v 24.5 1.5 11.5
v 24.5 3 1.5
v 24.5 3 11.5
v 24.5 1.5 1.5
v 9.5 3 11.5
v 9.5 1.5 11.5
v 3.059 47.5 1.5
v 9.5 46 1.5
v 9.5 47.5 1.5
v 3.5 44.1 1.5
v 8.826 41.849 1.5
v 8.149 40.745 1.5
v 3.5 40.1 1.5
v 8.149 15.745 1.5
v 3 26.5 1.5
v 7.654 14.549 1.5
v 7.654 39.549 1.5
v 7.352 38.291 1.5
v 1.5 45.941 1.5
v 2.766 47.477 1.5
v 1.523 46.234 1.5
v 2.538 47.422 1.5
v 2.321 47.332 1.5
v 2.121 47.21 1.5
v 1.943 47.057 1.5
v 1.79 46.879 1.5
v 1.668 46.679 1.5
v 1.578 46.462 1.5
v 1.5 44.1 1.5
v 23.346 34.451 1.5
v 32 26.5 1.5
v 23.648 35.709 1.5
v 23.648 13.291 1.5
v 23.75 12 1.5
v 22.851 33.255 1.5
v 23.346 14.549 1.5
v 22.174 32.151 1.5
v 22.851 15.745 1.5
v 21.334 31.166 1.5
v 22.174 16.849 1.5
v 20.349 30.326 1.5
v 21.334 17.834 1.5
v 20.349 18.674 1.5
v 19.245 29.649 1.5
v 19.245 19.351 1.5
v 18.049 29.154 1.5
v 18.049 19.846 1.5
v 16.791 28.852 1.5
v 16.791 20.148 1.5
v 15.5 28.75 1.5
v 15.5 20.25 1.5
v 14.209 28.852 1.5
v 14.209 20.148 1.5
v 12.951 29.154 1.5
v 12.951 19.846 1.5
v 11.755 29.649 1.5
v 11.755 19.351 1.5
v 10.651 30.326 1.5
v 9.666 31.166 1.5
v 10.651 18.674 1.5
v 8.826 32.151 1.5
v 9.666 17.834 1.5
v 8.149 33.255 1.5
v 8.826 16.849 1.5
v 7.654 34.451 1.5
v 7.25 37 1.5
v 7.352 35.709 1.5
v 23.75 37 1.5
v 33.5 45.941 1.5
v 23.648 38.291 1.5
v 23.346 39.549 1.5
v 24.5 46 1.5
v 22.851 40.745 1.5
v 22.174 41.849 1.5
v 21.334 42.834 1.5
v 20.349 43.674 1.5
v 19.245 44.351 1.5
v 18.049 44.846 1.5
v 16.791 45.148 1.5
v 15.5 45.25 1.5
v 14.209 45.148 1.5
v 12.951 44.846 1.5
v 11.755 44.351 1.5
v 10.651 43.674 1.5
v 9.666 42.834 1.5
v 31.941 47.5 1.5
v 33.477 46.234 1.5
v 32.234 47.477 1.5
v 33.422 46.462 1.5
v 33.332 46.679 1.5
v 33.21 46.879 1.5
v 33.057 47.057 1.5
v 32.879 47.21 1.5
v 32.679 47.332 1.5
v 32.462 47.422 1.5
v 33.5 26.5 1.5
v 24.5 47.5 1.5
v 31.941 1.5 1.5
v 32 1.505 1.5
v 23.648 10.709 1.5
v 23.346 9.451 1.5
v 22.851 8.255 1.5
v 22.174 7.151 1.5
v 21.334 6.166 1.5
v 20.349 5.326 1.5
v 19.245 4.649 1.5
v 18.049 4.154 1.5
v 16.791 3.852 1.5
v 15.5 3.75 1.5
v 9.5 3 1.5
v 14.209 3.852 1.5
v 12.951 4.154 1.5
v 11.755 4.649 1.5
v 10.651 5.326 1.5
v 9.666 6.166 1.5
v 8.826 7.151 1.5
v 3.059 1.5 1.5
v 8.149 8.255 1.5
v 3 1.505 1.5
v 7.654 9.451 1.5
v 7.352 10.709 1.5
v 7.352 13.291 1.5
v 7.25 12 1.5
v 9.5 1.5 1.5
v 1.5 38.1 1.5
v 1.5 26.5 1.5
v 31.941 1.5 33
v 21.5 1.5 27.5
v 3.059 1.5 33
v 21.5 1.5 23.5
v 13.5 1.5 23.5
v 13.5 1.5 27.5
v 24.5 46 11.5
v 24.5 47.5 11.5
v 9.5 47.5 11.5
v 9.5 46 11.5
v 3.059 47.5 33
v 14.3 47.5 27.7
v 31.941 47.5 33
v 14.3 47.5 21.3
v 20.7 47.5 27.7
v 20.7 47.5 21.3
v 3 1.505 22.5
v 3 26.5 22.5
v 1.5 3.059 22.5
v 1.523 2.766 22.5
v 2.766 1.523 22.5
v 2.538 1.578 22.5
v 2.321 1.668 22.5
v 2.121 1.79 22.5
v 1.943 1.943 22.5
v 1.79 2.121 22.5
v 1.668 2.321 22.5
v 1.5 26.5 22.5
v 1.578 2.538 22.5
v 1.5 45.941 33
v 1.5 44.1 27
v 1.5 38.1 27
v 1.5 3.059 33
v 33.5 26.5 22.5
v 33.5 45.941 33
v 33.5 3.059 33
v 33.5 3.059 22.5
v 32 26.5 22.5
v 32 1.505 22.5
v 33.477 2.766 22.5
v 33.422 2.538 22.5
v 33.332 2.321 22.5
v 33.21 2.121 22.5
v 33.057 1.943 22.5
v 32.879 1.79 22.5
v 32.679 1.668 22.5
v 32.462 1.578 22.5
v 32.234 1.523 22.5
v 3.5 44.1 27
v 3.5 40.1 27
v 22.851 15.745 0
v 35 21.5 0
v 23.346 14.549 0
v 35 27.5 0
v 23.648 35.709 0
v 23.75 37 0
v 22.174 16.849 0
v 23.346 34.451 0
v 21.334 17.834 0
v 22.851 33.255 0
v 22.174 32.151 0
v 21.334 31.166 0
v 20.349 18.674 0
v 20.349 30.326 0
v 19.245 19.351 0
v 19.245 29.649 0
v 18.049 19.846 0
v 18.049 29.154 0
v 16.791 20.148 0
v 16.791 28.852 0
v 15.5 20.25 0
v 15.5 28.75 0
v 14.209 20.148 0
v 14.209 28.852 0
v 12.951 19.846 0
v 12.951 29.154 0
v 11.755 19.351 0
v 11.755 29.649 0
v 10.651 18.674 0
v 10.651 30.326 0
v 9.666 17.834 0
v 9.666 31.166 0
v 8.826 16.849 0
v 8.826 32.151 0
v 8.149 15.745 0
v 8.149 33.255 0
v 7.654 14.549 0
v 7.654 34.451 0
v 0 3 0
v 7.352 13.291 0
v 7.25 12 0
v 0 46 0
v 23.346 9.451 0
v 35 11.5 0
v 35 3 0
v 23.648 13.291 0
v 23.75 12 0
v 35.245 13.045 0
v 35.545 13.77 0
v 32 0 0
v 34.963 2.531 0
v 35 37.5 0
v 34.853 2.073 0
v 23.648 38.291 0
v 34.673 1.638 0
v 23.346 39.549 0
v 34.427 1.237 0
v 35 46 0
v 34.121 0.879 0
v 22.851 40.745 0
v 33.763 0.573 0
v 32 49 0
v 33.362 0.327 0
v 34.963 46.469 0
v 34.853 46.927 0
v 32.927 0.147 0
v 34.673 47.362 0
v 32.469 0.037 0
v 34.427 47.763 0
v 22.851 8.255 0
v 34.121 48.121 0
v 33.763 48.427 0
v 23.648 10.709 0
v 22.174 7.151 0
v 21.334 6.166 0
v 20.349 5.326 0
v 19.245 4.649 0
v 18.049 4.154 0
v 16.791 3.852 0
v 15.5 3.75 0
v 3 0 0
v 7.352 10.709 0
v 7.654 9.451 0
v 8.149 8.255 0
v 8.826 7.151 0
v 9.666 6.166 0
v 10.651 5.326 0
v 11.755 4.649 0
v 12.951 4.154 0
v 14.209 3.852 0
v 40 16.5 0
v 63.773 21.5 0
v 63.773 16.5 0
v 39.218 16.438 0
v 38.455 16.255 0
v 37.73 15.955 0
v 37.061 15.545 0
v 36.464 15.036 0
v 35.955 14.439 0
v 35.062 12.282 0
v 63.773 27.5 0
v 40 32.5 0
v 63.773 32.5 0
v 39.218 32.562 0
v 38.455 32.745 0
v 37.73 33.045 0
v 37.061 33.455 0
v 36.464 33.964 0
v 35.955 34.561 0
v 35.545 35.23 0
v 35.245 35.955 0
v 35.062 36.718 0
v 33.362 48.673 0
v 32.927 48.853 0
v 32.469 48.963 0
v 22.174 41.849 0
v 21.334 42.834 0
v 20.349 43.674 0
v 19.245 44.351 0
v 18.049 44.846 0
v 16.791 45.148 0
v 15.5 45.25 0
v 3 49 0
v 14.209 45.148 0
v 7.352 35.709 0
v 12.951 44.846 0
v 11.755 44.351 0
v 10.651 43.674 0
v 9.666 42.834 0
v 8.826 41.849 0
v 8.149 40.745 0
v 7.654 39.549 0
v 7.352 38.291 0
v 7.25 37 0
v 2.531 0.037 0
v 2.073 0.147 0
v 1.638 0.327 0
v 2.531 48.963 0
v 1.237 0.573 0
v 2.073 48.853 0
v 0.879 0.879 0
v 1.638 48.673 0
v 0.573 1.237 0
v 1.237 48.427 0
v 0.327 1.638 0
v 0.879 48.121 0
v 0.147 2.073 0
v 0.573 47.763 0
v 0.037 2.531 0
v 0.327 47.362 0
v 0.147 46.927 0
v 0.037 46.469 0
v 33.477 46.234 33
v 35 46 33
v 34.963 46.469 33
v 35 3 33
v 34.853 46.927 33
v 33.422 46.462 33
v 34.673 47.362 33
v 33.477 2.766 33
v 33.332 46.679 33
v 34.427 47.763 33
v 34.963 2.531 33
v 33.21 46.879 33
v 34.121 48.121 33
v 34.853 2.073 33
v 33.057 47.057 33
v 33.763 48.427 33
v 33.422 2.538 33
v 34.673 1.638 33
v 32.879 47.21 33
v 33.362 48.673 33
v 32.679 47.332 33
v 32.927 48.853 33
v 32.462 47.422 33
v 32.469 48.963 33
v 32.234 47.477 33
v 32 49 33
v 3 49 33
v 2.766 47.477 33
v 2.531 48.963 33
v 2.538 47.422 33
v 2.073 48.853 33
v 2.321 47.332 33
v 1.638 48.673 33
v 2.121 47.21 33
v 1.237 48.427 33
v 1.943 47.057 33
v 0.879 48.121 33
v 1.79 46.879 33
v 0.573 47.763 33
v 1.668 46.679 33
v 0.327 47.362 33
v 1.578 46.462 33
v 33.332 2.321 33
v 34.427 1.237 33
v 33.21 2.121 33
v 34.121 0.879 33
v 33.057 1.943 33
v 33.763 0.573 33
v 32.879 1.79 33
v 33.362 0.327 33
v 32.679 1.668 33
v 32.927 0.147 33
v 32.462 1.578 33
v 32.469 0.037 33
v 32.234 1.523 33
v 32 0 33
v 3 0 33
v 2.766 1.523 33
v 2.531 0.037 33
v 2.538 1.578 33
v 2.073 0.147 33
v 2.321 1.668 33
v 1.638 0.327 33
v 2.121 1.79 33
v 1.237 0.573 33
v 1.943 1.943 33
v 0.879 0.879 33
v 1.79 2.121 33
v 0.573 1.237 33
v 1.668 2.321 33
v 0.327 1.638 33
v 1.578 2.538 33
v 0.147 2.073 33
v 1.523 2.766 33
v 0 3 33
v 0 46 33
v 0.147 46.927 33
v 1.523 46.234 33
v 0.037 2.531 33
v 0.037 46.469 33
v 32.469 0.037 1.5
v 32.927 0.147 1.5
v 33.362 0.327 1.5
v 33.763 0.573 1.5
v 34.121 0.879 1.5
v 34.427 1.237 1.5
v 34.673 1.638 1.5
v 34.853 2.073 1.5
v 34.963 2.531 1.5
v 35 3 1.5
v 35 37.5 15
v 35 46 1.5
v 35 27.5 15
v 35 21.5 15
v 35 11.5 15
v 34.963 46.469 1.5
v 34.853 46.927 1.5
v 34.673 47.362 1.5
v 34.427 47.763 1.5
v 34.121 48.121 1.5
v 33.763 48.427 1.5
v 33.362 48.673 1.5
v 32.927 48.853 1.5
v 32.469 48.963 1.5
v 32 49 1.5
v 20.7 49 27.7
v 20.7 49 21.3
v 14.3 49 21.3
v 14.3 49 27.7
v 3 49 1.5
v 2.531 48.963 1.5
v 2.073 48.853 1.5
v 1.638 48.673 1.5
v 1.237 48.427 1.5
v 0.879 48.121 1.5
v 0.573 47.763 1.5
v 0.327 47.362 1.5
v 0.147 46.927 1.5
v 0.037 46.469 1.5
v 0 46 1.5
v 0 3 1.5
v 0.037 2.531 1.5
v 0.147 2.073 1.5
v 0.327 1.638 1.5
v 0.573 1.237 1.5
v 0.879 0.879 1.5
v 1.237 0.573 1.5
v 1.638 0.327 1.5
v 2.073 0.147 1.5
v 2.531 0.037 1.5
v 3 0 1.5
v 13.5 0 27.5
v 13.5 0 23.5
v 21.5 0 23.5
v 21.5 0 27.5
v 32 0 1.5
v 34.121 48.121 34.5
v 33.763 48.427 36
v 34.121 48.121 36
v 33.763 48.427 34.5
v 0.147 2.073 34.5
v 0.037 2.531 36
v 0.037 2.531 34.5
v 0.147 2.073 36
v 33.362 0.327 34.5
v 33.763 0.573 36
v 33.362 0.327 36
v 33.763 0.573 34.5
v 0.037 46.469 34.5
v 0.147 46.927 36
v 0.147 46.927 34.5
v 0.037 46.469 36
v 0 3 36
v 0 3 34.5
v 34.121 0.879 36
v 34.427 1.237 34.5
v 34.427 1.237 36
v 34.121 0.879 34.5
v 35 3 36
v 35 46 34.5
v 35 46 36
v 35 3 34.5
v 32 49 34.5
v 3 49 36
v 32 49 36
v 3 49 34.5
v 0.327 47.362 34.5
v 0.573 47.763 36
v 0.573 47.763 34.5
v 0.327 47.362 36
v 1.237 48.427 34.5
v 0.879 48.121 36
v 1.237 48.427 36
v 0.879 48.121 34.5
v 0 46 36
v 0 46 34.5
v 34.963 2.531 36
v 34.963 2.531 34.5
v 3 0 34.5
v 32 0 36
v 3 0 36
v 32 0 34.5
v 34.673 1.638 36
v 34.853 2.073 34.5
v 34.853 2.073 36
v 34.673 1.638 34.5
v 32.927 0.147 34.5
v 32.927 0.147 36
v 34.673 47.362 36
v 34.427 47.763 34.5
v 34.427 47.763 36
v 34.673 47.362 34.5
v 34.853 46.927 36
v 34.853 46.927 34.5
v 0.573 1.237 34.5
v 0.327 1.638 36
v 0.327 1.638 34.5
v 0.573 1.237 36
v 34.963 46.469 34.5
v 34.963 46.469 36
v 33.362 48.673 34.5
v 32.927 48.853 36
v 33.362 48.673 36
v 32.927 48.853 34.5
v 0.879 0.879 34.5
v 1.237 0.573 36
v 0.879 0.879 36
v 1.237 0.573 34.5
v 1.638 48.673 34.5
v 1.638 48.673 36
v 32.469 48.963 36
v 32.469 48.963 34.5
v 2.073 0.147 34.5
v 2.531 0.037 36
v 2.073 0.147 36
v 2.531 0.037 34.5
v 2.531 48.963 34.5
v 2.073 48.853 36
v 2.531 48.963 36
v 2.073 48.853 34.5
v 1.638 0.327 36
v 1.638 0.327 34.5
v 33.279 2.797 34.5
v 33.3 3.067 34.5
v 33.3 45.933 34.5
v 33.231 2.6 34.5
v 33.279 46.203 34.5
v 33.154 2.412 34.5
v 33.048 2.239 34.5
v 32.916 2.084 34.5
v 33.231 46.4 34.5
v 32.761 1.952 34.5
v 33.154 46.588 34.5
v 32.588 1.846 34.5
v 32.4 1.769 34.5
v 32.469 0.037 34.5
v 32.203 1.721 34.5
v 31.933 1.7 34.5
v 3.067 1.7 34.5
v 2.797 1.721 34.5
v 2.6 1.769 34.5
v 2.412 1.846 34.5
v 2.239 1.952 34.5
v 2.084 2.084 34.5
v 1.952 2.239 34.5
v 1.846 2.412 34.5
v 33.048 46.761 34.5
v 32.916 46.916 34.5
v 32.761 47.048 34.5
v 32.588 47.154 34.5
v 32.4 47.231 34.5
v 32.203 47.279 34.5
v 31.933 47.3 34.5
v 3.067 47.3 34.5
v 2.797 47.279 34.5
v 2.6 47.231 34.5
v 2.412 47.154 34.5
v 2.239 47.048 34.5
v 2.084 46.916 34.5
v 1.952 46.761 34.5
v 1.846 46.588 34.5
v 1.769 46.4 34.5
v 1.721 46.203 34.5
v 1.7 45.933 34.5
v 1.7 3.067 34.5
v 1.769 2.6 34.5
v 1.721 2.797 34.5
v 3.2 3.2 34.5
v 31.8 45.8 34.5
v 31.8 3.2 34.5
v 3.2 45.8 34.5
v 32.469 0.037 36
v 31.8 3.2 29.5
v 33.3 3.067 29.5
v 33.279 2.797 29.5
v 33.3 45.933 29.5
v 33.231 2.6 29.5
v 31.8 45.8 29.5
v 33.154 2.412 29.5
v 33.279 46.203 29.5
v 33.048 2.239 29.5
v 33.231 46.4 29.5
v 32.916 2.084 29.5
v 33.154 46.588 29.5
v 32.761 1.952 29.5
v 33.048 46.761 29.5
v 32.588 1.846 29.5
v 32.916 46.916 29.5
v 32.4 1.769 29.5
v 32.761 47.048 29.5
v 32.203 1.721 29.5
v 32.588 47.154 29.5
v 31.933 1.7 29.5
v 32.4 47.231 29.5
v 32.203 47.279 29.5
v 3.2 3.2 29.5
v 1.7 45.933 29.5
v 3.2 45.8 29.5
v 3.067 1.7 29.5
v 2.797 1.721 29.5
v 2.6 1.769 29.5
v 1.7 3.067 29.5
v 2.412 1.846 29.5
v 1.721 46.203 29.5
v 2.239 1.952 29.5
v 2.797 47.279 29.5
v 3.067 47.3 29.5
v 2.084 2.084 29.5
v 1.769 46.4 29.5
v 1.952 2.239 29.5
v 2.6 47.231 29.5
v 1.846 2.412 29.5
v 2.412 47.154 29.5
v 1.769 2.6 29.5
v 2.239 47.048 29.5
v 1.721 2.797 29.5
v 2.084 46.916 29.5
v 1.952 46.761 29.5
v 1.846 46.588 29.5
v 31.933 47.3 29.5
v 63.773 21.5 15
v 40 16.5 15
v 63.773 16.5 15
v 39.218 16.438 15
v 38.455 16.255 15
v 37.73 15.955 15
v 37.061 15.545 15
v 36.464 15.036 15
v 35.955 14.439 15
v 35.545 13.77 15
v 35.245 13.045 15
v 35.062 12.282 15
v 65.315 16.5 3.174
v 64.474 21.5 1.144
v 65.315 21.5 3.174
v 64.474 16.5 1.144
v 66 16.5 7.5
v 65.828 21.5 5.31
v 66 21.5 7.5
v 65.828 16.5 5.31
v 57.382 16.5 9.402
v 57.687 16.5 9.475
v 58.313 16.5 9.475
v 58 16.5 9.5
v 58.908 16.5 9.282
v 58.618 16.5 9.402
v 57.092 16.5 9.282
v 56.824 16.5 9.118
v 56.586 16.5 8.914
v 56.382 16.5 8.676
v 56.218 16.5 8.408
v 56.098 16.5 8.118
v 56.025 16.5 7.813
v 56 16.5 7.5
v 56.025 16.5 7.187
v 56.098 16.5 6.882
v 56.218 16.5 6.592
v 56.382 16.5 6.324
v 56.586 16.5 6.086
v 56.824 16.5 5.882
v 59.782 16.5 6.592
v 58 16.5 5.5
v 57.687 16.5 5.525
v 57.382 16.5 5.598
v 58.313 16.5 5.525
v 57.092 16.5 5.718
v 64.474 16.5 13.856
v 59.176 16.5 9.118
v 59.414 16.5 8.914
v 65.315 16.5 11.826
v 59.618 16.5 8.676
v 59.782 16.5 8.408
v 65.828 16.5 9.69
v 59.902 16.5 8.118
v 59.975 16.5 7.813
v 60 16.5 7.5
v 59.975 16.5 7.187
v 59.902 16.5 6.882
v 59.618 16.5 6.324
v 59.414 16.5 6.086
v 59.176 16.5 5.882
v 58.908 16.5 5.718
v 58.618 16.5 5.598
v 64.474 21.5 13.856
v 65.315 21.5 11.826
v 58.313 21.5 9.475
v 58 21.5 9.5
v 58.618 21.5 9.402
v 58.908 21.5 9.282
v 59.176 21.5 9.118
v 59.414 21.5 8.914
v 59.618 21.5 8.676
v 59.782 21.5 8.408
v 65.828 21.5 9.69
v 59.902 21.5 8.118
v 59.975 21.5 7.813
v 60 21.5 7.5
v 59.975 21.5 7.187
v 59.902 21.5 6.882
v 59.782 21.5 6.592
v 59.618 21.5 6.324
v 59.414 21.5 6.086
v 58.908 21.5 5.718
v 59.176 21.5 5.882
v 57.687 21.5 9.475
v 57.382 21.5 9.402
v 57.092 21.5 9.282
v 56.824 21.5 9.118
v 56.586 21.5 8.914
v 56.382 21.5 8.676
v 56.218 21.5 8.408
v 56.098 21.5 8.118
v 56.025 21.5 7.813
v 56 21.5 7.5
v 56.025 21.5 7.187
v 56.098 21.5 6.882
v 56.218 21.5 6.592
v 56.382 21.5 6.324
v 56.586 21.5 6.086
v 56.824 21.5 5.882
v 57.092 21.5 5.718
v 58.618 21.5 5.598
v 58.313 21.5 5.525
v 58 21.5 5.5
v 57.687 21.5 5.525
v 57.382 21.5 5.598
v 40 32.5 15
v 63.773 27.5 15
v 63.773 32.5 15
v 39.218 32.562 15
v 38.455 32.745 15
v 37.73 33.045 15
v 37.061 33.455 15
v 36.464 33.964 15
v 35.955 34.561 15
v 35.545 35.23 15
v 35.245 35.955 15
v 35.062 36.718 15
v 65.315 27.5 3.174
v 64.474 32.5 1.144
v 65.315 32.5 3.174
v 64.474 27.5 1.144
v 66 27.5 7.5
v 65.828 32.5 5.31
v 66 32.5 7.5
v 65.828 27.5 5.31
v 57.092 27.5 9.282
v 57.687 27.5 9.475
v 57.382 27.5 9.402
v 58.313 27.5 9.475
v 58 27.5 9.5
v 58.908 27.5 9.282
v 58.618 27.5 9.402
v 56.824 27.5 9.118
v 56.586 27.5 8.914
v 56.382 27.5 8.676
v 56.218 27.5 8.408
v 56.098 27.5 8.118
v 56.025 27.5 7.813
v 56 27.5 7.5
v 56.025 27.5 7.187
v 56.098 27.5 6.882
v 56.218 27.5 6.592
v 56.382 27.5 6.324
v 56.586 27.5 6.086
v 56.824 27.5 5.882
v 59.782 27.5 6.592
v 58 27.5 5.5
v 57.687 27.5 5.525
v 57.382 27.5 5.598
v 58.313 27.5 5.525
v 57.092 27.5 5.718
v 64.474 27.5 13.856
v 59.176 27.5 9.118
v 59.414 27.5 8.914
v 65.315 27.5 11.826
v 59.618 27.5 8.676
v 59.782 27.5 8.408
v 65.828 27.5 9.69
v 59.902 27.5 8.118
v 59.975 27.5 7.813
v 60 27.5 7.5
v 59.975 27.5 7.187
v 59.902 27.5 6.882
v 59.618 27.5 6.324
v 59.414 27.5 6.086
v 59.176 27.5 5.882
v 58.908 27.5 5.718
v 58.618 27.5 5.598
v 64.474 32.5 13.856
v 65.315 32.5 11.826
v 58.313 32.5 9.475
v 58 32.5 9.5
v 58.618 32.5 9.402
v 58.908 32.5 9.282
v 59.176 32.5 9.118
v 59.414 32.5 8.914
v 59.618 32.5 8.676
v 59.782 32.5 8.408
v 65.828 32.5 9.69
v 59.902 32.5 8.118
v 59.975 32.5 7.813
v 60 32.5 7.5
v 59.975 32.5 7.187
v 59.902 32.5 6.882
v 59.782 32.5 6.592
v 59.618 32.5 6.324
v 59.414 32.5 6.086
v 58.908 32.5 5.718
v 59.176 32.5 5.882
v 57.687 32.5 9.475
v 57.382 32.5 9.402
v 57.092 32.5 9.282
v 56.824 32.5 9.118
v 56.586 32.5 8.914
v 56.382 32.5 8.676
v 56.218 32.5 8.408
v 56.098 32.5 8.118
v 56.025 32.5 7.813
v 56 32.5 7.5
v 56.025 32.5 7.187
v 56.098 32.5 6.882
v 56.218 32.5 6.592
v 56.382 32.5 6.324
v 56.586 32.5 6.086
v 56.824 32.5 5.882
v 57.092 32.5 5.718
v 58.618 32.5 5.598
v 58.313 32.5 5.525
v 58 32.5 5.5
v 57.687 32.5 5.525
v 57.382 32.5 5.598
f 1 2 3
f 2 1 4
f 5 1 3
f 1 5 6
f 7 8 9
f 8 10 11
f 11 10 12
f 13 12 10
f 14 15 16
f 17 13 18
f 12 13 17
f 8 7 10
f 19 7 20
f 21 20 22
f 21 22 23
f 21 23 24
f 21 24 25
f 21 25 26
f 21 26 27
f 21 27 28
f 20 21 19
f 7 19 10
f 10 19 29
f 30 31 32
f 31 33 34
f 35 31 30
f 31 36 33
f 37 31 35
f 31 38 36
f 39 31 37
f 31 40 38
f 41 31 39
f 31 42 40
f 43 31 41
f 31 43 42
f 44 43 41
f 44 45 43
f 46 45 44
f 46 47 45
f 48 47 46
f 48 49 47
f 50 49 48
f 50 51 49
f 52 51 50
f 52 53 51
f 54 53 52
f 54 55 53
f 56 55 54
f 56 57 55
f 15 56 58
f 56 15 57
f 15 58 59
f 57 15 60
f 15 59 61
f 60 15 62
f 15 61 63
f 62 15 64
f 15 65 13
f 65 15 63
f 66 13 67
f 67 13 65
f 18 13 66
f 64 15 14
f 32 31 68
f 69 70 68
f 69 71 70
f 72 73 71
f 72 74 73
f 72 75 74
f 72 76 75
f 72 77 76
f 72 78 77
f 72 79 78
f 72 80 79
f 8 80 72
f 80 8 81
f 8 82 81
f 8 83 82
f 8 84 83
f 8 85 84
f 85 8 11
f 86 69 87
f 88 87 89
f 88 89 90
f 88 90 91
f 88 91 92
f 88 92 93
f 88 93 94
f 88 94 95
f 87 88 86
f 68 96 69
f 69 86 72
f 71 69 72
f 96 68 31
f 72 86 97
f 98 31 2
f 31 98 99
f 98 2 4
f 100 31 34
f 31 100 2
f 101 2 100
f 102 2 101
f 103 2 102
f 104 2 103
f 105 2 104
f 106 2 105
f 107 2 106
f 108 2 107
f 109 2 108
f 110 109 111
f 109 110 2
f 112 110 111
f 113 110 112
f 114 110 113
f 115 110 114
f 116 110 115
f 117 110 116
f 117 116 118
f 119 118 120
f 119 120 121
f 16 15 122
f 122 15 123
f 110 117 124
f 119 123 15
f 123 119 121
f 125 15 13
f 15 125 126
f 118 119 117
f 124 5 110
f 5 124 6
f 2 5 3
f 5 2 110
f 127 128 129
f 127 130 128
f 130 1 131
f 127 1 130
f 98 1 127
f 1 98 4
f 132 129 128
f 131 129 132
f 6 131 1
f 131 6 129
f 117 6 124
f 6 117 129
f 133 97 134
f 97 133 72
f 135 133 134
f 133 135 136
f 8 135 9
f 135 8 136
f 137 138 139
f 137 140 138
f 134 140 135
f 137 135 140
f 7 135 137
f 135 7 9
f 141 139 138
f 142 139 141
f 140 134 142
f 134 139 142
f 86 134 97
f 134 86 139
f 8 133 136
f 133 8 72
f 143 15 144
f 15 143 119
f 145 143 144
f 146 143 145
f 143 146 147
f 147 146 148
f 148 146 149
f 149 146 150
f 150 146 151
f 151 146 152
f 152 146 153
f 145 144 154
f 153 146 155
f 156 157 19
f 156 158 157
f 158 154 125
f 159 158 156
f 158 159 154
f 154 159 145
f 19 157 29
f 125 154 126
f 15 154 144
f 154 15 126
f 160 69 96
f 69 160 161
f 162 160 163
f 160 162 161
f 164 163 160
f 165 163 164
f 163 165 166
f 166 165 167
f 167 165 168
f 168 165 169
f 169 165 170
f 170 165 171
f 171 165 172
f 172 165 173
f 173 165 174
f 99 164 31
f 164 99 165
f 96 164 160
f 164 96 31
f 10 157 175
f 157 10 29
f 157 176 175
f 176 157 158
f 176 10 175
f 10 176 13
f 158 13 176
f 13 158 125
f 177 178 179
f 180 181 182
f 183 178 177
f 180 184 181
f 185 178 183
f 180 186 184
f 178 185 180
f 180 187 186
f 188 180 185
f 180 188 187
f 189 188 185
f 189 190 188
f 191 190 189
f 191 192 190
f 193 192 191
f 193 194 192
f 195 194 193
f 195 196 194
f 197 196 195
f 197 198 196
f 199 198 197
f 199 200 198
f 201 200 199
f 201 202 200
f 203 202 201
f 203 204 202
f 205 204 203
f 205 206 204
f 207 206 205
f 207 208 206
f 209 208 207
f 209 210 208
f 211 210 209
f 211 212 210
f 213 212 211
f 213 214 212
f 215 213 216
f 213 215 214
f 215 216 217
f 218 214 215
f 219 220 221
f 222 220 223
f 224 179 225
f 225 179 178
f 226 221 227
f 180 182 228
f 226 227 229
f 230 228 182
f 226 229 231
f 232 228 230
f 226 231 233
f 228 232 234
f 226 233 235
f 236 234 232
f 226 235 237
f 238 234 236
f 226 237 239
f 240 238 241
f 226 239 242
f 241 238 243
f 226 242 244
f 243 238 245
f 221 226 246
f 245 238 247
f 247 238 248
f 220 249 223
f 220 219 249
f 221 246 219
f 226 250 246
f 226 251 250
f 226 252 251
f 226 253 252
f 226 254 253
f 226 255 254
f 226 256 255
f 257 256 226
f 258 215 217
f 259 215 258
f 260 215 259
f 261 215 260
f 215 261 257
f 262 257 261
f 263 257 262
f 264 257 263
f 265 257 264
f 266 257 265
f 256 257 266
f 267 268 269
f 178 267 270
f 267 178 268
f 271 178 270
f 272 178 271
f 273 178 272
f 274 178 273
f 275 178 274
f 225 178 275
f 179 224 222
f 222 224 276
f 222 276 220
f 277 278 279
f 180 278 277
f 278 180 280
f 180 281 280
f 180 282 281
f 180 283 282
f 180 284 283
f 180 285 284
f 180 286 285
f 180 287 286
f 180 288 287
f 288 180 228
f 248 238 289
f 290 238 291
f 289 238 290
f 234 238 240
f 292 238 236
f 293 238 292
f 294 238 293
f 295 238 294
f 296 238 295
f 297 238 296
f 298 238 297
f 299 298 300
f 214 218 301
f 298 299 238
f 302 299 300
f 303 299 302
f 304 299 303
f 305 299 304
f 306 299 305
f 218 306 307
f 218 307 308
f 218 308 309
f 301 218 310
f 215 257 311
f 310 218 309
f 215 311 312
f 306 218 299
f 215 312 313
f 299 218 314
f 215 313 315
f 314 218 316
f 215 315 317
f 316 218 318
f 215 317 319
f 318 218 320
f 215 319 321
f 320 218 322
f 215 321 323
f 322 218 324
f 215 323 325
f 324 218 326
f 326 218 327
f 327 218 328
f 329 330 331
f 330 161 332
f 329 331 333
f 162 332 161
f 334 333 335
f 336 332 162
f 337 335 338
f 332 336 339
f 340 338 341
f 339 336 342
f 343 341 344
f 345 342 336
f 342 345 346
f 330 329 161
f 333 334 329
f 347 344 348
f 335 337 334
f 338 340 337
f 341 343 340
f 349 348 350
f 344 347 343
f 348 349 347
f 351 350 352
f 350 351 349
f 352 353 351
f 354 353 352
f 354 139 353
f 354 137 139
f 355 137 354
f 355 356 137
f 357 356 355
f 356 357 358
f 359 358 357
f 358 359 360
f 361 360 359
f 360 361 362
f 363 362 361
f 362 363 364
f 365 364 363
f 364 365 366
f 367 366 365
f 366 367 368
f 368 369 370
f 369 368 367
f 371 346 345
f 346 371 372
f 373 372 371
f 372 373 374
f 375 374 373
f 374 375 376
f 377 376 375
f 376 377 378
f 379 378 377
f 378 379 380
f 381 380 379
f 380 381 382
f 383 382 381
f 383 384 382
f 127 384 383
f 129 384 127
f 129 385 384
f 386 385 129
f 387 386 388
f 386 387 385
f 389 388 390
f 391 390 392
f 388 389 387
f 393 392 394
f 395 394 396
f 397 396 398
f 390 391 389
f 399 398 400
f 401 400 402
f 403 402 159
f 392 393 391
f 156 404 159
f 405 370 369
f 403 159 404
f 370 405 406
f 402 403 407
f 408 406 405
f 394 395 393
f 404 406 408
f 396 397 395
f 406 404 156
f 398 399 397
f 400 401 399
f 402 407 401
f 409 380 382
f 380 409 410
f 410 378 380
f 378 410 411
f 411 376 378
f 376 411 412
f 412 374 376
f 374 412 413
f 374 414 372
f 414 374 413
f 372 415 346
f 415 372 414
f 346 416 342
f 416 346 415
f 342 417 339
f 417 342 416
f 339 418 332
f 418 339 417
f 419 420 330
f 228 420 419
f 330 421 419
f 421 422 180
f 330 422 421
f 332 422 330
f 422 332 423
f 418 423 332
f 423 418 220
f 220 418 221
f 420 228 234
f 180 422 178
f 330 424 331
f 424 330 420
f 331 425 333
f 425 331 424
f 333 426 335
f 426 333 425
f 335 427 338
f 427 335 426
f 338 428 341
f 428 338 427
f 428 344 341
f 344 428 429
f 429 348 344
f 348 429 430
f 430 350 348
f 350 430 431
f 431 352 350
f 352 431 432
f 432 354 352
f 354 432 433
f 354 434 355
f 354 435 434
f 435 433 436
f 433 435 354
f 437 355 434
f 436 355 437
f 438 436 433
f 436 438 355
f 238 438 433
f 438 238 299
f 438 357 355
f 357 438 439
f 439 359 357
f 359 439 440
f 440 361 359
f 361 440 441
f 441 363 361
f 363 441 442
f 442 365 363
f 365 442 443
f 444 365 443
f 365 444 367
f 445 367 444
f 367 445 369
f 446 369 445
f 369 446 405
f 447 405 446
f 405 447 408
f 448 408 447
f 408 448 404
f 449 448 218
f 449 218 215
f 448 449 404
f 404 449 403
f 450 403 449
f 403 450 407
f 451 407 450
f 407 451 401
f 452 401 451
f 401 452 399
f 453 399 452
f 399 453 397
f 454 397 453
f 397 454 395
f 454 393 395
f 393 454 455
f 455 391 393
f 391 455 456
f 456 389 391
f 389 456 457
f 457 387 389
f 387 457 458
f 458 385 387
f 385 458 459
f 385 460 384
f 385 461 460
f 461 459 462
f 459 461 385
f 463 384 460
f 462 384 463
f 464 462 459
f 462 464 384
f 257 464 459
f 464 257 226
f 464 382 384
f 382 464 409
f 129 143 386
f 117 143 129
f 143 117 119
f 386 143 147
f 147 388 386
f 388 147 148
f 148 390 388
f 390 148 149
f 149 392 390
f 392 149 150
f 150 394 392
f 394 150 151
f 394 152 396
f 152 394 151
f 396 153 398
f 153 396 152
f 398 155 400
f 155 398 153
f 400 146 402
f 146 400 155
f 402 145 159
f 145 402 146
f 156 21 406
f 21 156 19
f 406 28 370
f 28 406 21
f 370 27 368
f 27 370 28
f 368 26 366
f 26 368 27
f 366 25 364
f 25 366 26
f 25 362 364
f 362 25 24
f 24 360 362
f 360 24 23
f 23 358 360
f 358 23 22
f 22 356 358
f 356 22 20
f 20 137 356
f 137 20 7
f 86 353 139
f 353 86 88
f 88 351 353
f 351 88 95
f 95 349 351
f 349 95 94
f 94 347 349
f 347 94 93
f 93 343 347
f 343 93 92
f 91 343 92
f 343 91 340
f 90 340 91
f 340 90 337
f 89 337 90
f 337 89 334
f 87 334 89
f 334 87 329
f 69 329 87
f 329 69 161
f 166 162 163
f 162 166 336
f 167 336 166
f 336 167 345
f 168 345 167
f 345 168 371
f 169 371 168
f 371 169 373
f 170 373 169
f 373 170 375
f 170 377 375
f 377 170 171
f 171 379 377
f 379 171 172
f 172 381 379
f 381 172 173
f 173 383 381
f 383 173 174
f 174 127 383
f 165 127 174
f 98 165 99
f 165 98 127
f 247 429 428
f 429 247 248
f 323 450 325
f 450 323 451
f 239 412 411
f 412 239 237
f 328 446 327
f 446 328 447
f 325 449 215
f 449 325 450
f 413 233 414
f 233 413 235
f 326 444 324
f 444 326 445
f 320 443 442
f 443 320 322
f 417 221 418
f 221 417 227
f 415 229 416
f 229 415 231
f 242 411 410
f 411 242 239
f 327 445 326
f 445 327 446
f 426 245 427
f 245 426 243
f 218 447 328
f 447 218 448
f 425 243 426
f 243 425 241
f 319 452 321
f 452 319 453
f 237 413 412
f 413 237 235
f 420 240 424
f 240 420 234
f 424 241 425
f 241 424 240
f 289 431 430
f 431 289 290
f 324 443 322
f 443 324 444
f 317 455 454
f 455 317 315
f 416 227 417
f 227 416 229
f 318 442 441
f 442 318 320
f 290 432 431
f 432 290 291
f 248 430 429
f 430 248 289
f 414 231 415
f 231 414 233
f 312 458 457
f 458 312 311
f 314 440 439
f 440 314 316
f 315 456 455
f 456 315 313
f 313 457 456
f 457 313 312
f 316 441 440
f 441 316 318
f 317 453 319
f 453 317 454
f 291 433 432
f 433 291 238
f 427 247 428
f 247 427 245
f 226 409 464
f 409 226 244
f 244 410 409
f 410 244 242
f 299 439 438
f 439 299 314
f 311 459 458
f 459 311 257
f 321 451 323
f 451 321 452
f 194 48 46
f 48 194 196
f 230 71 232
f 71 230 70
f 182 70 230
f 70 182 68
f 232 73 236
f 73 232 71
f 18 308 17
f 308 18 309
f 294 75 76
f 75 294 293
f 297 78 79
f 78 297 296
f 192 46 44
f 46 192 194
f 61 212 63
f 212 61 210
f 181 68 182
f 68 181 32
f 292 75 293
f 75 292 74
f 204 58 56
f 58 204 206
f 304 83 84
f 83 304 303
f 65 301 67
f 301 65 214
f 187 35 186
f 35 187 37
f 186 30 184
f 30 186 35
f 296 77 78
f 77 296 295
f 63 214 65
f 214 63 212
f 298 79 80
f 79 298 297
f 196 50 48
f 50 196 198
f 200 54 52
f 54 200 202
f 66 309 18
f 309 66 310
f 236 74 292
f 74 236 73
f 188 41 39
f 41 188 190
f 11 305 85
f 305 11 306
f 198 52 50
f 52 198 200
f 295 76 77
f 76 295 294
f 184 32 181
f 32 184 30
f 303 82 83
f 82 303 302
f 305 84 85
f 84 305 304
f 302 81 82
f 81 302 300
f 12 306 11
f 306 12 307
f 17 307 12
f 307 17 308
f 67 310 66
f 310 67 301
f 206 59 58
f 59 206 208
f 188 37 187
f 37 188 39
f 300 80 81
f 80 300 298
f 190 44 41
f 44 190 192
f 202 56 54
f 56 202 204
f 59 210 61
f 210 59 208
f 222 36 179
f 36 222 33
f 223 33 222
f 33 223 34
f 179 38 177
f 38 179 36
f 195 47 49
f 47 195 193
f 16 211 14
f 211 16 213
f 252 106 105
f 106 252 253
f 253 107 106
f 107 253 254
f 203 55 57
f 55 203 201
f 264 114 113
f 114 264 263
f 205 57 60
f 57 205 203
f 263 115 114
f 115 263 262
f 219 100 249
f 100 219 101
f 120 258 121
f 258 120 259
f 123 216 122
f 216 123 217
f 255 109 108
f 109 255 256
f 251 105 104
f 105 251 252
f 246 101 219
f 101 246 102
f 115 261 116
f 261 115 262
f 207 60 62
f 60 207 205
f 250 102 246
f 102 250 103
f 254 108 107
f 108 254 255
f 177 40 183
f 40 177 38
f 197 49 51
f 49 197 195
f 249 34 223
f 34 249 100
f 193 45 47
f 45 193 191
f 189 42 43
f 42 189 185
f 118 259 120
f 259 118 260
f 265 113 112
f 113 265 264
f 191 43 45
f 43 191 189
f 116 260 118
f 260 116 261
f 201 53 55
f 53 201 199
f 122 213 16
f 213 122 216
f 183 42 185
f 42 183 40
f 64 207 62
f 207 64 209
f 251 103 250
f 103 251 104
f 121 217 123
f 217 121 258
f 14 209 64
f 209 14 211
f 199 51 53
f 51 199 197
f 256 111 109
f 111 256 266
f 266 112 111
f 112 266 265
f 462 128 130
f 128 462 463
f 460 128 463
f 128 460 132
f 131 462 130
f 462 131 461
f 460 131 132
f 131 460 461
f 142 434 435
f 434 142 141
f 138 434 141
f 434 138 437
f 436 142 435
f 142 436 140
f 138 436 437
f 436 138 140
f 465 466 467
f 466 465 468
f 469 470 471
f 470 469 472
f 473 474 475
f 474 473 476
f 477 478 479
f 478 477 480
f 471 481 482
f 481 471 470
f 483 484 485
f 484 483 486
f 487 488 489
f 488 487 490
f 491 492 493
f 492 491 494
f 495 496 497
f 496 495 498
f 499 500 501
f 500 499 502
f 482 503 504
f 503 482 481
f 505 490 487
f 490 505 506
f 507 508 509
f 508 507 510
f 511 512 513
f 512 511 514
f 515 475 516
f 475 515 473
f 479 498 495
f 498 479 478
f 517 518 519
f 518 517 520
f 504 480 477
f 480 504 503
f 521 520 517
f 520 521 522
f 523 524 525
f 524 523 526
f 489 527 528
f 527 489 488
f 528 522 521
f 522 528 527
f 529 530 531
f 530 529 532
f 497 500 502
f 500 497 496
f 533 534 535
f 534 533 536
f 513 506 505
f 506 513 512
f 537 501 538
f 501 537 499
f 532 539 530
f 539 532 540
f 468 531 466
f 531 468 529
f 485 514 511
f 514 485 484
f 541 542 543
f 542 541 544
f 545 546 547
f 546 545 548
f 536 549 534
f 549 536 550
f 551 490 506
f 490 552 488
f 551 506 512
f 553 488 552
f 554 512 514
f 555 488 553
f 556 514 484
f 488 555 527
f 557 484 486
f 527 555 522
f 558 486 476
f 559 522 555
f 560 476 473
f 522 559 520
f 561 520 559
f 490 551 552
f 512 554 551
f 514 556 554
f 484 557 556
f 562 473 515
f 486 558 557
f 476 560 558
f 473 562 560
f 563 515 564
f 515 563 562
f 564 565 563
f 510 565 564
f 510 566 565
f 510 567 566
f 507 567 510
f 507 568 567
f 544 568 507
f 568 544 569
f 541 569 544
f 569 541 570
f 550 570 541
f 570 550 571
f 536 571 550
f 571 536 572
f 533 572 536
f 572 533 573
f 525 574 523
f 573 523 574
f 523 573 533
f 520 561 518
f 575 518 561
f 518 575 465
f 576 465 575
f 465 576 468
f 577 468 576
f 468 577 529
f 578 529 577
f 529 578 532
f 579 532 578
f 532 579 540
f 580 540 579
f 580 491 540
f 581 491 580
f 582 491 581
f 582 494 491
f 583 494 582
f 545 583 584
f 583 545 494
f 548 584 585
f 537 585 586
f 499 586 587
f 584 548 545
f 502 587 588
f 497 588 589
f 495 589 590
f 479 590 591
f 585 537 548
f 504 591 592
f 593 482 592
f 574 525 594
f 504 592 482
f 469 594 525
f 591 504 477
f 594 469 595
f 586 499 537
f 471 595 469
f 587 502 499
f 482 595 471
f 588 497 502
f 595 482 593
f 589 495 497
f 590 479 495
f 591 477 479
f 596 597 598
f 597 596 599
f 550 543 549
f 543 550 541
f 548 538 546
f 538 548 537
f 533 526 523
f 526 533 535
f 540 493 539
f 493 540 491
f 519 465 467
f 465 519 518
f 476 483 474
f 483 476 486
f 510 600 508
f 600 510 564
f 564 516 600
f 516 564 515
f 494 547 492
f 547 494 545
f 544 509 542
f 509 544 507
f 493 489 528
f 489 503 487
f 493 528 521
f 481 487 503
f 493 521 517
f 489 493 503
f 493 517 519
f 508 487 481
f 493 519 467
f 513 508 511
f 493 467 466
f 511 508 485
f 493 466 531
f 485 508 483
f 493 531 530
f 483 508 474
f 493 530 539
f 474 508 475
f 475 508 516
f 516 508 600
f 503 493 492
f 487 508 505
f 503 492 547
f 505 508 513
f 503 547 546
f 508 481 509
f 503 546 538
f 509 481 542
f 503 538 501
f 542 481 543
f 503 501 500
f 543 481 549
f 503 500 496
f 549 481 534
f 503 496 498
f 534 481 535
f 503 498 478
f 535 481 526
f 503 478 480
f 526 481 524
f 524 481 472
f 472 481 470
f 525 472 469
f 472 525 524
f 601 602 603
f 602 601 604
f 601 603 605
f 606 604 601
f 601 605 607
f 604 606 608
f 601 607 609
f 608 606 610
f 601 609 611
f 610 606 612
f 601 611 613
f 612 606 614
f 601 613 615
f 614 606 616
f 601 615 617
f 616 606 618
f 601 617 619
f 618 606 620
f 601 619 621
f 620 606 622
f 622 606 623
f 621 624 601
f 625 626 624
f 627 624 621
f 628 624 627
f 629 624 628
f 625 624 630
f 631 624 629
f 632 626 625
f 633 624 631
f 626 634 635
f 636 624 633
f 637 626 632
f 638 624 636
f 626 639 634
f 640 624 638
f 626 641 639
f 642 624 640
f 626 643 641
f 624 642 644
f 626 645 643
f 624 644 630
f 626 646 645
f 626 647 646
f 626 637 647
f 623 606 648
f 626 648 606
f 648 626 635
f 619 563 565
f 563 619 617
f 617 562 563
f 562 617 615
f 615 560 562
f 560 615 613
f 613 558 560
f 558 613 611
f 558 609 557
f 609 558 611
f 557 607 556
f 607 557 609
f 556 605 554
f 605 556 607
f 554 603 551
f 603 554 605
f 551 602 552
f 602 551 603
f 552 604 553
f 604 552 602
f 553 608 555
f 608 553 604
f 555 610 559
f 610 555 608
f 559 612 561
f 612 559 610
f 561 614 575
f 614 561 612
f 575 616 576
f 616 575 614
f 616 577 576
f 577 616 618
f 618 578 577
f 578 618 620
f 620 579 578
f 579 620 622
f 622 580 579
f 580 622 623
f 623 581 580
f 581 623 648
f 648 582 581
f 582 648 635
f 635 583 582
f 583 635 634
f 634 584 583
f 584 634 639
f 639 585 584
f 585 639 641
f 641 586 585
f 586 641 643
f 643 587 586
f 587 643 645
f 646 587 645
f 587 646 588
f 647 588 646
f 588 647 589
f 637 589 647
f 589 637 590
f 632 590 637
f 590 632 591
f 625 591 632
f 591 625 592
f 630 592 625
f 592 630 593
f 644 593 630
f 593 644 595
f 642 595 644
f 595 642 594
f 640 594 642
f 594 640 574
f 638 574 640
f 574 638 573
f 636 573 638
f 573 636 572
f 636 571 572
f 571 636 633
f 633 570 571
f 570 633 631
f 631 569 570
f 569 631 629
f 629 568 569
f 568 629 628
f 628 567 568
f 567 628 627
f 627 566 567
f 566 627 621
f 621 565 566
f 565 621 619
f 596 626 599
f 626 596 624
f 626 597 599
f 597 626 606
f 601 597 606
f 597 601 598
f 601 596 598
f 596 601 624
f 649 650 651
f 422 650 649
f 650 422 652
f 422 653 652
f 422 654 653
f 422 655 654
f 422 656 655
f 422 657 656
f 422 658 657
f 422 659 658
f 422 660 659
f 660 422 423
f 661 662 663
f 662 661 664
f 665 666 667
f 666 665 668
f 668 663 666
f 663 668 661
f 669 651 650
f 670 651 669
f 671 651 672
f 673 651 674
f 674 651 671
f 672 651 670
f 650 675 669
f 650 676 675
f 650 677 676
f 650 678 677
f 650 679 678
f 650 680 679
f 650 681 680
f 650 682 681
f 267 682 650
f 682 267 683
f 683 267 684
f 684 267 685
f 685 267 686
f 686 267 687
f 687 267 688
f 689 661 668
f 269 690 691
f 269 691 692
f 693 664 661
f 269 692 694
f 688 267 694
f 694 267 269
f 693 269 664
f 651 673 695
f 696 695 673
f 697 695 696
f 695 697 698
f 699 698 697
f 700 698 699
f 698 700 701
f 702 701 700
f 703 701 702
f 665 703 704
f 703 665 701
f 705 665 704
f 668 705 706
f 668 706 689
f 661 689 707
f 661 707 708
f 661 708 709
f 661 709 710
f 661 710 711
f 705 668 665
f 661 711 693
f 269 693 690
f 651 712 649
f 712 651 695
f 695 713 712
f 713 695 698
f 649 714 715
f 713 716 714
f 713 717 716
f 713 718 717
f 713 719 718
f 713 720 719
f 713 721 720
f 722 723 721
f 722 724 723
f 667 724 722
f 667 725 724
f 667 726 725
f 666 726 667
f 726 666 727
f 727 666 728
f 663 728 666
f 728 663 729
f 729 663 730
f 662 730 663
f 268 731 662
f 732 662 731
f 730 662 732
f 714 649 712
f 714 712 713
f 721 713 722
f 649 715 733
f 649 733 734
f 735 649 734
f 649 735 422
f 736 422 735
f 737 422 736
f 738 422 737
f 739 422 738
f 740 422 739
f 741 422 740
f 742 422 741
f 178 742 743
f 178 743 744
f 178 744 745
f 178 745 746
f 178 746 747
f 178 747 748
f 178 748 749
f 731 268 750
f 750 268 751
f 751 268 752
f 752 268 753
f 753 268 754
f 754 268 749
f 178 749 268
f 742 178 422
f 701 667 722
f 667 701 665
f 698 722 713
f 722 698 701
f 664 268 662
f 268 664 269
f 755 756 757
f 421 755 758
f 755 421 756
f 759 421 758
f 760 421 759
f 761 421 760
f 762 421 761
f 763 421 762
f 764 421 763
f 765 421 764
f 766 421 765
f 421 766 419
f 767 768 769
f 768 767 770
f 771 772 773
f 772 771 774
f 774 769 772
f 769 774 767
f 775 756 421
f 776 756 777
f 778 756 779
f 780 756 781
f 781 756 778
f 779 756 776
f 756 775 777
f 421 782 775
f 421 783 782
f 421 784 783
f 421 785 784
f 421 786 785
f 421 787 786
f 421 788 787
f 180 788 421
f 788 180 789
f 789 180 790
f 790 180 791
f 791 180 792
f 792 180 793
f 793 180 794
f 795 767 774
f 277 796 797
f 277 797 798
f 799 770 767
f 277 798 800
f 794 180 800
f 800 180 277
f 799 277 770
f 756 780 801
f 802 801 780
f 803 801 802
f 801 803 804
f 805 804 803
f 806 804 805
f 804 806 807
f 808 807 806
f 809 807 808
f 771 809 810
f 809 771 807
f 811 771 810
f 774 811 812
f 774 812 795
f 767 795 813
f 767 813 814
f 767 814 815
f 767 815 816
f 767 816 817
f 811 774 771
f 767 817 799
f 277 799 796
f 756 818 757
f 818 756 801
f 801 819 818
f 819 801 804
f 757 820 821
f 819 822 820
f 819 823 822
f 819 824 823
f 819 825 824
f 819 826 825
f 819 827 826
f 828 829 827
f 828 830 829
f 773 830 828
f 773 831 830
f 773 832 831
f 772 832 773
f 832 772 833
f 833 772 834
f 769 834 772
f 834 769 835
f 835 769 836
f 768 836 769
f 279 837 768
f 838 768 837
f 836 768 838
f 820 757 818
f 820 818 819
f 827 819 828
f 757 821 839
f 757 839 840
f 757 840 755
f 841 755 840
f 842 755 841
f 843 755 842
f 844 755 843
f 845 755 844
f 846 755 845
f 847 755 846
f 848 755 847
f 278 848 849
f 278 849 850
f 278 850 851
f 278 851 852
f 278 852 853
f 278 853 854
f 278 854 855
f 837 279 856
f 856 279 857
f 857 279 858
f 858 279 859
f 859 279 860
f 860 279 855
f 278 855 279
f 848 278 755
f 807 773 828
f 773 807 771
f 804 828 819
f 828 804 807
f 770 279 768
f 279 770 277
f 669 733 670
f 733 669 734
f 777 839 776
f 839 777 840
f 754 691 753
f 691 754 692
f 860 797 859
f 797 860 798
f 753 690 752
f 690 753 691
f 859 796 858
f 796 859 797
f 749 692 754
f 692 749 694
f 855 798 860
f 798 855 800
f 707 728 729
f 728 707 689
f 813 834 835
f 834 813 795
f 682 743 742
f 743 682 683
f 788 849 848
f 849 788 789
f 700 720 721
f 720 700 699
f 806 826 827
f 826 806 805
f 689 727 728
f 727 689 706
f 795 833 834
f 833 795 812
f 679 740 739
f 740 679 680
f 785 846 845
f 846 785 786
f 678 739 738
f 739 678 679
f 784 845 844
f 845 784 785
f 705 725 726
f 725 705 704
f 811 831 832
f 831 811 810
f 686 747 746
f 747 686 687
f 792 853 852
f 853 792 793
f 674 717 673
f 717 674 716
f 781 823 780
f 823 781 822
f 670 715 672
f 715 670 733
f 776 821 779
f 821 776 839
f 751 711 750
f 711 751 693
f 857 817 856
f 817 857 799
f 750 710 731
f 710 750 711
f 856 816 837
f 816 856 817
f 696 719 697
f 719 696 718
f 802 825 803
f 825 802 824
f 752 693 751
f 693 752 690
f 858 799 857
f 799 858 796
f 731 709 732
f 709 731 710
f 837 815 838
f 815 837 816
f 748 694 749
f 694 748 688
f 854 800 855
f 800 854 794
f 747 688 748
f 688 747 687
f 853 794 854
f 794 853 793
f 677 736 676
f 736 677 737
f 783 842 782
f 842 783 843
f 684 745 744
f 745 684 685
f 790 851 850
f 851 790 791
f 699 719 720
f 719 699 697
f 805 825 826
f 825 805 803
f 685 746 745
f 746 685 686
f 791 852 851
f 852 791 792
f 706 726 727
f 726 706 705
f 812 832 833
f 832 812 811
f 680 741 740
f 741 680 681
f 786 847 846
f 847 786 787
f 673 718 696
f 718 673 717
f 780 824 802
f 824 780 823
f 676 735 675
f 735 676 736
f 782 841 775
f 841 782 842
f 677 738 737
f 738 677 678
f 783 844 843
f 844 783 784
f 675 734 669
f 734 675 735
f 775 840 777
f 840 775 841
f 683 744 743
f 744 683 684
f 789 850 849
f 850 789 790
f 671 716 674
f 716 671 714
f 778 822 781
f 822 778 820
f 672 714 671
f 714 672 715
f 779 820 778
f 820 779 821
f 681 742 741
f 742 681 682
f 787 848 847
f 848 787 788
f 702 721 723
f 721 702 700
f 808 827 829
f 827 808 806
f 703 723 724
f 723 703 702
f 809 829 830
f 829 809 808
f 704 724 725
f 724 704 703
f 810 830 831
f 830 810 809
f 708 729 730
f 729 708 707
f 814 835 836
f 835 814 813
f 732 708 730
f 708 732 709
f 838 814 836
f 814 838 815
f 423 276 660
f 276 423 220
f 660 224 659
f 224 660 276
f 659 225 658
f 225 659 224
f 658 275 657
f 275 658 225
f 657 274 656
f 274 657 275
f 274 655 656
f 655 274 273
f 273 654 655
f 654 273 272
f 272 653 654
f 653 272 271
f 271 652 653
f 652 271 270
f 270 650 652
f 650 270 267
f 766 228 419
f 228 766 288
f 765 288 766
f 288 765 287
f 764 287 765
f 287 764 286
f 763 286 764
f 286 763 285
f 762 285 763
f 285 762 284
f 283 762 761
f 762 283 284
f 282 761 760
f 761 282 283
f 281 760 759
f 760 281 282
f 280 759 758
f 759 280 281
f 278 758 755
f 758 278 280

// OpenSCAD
us_hole_dia = 16.5; //Lochdurchmesser Ultraschallmodul
us_hole_dis = 25;
us_h_speaker = 12.5;
button_x = 6.4;
wall = 1.5;
inner_y = 46;
inner_x = 32;
esp_x = 31.5;
esp_y = 39;
esp_z = 1.5;
inner_z = 30;
outer_r = 3;
outer_x = inner_x+2*wall;
outer_y = inner_y+2*wall;
outer_z = inner_z+2*wall;
us_d_x = 15.5; //Abstand in der Ultrashallsensorlöcher von oben

$fn = 40;

    

module stativ(){
    width = 15;
    height = 28;
    thick = 5;
    module base(){
        linear_extrude(thick){
            intersection(){
            circle(r = 14);
            square([width, height], center = true);
            }
            translate([0,3,0])square([width, height], center = true);
        }
    }
    difference(){
        union(){
            base();
            translate([0,0,11])base();
        }
        translate([0,-6,0])cylinder(d  = 4, h = 20);
    }
    module chamfer(){
        linear_extrude(width){
            difference(){
            square(5);
            circle(d = 10);
            }
        }
    }
    translate([width/2,12,-5])rotate([0,-90,0])chamfer();
    translate([-width/2,12,21])rotate([0,90,0])chamfer();
}
    
    
    
    
module case(){
    module corner(){
        circle(r = outer_r);
    }
    module floor(){
        hull(){
            corner();
            translate([outer_x-2*outer_r,0,0])corner();
            translate([outer_x-2*outer_r,outer_y-2*outer_r,0])corner();
            translate([0,outer_y-2*outer_r,0])corner();
        }
    }
    module walls(){
        linear_extrude(outer_z)
            difference(){
            floor();
            offset(delta = -wall)floor();  
           
        }
        linear_extrude(wall)floor();
    }
    module us_holes(){
        translate([0,us_hole_dis/2,0])cylinder(d = us_hole_dia, h  = us_h_speaker);
        translate([0,-us_hole_dis/2,0])cylinder(d = us_hole_dia, h  = us_h_speaker);
    }
    //Abstandshalter für Module
    module puffer(){
        module tria(a = 10,b = 10){
            p1 = [0,0];
            p2 = [0,a];
            p3 = [b,a];
            polygon(points = [p1,p2,p3]);
        }
        u_z = 10;
        u_y = 1.5;
        u_x = 15;
        
        e_z = 21;
        e_y  =25;
        e_x = 1.5;
        
        e_s_y = 36.6; //Abstand
        translate([us_d_x-u_x/2,0,0])cube([u_x,u_y,u_z]);
        translate([us_d_x-u_x/2,inner_y-u_y,0])cube([u_x,u_y,u_z]);
        cube([e_x,e_y,e_z]);
        translate([inner_x-e_x,0,0])cube([e_x,e_y,e_z]);
        linear_extrude(inner_z-3*wall)translate([0,e_s_y,0]){
            tria(a=2,b=2);
            translate([0,2])square([2,4]);
        }

    }
    translate([wall,wall,wall])puffer();
    difference(){
        translate([outer_r,outer_r,0])walls();
        translate([us_d_x,outer_y/2,-2])us_holes();
        translate([outer_x/2,-2,21+wall+3])cube([8,10,4], center = true);//hole for usb
        translate([outer_x/2,outer_y-4,21+wall+2])cube([button_x,20,button_x], center = true);
        
    }
    
    module deckel(){
        linear_extrude(wall)translate([outer_r,outer_r,0])floor();
        mirror([0,0,1])linear_extrude(5)difference(){
            offset(delta = -wall-0.2)translate([outer_r,outer_r,-wall])floor();
            offset(delta = -2*wall-0.2)translate([outer_r,outer_r,-wall])floor();
        }

        
    }
    translate([0,0,outer_z+wall])deckel();

}
difference(){
    union(){
    case();
    translate([outer_x+17,outer_y/2-16/2,7.5])rotate([0,90,90])stativ();
    }
*cube([outer_x,outer_y/2,outer_z+10]);
}
